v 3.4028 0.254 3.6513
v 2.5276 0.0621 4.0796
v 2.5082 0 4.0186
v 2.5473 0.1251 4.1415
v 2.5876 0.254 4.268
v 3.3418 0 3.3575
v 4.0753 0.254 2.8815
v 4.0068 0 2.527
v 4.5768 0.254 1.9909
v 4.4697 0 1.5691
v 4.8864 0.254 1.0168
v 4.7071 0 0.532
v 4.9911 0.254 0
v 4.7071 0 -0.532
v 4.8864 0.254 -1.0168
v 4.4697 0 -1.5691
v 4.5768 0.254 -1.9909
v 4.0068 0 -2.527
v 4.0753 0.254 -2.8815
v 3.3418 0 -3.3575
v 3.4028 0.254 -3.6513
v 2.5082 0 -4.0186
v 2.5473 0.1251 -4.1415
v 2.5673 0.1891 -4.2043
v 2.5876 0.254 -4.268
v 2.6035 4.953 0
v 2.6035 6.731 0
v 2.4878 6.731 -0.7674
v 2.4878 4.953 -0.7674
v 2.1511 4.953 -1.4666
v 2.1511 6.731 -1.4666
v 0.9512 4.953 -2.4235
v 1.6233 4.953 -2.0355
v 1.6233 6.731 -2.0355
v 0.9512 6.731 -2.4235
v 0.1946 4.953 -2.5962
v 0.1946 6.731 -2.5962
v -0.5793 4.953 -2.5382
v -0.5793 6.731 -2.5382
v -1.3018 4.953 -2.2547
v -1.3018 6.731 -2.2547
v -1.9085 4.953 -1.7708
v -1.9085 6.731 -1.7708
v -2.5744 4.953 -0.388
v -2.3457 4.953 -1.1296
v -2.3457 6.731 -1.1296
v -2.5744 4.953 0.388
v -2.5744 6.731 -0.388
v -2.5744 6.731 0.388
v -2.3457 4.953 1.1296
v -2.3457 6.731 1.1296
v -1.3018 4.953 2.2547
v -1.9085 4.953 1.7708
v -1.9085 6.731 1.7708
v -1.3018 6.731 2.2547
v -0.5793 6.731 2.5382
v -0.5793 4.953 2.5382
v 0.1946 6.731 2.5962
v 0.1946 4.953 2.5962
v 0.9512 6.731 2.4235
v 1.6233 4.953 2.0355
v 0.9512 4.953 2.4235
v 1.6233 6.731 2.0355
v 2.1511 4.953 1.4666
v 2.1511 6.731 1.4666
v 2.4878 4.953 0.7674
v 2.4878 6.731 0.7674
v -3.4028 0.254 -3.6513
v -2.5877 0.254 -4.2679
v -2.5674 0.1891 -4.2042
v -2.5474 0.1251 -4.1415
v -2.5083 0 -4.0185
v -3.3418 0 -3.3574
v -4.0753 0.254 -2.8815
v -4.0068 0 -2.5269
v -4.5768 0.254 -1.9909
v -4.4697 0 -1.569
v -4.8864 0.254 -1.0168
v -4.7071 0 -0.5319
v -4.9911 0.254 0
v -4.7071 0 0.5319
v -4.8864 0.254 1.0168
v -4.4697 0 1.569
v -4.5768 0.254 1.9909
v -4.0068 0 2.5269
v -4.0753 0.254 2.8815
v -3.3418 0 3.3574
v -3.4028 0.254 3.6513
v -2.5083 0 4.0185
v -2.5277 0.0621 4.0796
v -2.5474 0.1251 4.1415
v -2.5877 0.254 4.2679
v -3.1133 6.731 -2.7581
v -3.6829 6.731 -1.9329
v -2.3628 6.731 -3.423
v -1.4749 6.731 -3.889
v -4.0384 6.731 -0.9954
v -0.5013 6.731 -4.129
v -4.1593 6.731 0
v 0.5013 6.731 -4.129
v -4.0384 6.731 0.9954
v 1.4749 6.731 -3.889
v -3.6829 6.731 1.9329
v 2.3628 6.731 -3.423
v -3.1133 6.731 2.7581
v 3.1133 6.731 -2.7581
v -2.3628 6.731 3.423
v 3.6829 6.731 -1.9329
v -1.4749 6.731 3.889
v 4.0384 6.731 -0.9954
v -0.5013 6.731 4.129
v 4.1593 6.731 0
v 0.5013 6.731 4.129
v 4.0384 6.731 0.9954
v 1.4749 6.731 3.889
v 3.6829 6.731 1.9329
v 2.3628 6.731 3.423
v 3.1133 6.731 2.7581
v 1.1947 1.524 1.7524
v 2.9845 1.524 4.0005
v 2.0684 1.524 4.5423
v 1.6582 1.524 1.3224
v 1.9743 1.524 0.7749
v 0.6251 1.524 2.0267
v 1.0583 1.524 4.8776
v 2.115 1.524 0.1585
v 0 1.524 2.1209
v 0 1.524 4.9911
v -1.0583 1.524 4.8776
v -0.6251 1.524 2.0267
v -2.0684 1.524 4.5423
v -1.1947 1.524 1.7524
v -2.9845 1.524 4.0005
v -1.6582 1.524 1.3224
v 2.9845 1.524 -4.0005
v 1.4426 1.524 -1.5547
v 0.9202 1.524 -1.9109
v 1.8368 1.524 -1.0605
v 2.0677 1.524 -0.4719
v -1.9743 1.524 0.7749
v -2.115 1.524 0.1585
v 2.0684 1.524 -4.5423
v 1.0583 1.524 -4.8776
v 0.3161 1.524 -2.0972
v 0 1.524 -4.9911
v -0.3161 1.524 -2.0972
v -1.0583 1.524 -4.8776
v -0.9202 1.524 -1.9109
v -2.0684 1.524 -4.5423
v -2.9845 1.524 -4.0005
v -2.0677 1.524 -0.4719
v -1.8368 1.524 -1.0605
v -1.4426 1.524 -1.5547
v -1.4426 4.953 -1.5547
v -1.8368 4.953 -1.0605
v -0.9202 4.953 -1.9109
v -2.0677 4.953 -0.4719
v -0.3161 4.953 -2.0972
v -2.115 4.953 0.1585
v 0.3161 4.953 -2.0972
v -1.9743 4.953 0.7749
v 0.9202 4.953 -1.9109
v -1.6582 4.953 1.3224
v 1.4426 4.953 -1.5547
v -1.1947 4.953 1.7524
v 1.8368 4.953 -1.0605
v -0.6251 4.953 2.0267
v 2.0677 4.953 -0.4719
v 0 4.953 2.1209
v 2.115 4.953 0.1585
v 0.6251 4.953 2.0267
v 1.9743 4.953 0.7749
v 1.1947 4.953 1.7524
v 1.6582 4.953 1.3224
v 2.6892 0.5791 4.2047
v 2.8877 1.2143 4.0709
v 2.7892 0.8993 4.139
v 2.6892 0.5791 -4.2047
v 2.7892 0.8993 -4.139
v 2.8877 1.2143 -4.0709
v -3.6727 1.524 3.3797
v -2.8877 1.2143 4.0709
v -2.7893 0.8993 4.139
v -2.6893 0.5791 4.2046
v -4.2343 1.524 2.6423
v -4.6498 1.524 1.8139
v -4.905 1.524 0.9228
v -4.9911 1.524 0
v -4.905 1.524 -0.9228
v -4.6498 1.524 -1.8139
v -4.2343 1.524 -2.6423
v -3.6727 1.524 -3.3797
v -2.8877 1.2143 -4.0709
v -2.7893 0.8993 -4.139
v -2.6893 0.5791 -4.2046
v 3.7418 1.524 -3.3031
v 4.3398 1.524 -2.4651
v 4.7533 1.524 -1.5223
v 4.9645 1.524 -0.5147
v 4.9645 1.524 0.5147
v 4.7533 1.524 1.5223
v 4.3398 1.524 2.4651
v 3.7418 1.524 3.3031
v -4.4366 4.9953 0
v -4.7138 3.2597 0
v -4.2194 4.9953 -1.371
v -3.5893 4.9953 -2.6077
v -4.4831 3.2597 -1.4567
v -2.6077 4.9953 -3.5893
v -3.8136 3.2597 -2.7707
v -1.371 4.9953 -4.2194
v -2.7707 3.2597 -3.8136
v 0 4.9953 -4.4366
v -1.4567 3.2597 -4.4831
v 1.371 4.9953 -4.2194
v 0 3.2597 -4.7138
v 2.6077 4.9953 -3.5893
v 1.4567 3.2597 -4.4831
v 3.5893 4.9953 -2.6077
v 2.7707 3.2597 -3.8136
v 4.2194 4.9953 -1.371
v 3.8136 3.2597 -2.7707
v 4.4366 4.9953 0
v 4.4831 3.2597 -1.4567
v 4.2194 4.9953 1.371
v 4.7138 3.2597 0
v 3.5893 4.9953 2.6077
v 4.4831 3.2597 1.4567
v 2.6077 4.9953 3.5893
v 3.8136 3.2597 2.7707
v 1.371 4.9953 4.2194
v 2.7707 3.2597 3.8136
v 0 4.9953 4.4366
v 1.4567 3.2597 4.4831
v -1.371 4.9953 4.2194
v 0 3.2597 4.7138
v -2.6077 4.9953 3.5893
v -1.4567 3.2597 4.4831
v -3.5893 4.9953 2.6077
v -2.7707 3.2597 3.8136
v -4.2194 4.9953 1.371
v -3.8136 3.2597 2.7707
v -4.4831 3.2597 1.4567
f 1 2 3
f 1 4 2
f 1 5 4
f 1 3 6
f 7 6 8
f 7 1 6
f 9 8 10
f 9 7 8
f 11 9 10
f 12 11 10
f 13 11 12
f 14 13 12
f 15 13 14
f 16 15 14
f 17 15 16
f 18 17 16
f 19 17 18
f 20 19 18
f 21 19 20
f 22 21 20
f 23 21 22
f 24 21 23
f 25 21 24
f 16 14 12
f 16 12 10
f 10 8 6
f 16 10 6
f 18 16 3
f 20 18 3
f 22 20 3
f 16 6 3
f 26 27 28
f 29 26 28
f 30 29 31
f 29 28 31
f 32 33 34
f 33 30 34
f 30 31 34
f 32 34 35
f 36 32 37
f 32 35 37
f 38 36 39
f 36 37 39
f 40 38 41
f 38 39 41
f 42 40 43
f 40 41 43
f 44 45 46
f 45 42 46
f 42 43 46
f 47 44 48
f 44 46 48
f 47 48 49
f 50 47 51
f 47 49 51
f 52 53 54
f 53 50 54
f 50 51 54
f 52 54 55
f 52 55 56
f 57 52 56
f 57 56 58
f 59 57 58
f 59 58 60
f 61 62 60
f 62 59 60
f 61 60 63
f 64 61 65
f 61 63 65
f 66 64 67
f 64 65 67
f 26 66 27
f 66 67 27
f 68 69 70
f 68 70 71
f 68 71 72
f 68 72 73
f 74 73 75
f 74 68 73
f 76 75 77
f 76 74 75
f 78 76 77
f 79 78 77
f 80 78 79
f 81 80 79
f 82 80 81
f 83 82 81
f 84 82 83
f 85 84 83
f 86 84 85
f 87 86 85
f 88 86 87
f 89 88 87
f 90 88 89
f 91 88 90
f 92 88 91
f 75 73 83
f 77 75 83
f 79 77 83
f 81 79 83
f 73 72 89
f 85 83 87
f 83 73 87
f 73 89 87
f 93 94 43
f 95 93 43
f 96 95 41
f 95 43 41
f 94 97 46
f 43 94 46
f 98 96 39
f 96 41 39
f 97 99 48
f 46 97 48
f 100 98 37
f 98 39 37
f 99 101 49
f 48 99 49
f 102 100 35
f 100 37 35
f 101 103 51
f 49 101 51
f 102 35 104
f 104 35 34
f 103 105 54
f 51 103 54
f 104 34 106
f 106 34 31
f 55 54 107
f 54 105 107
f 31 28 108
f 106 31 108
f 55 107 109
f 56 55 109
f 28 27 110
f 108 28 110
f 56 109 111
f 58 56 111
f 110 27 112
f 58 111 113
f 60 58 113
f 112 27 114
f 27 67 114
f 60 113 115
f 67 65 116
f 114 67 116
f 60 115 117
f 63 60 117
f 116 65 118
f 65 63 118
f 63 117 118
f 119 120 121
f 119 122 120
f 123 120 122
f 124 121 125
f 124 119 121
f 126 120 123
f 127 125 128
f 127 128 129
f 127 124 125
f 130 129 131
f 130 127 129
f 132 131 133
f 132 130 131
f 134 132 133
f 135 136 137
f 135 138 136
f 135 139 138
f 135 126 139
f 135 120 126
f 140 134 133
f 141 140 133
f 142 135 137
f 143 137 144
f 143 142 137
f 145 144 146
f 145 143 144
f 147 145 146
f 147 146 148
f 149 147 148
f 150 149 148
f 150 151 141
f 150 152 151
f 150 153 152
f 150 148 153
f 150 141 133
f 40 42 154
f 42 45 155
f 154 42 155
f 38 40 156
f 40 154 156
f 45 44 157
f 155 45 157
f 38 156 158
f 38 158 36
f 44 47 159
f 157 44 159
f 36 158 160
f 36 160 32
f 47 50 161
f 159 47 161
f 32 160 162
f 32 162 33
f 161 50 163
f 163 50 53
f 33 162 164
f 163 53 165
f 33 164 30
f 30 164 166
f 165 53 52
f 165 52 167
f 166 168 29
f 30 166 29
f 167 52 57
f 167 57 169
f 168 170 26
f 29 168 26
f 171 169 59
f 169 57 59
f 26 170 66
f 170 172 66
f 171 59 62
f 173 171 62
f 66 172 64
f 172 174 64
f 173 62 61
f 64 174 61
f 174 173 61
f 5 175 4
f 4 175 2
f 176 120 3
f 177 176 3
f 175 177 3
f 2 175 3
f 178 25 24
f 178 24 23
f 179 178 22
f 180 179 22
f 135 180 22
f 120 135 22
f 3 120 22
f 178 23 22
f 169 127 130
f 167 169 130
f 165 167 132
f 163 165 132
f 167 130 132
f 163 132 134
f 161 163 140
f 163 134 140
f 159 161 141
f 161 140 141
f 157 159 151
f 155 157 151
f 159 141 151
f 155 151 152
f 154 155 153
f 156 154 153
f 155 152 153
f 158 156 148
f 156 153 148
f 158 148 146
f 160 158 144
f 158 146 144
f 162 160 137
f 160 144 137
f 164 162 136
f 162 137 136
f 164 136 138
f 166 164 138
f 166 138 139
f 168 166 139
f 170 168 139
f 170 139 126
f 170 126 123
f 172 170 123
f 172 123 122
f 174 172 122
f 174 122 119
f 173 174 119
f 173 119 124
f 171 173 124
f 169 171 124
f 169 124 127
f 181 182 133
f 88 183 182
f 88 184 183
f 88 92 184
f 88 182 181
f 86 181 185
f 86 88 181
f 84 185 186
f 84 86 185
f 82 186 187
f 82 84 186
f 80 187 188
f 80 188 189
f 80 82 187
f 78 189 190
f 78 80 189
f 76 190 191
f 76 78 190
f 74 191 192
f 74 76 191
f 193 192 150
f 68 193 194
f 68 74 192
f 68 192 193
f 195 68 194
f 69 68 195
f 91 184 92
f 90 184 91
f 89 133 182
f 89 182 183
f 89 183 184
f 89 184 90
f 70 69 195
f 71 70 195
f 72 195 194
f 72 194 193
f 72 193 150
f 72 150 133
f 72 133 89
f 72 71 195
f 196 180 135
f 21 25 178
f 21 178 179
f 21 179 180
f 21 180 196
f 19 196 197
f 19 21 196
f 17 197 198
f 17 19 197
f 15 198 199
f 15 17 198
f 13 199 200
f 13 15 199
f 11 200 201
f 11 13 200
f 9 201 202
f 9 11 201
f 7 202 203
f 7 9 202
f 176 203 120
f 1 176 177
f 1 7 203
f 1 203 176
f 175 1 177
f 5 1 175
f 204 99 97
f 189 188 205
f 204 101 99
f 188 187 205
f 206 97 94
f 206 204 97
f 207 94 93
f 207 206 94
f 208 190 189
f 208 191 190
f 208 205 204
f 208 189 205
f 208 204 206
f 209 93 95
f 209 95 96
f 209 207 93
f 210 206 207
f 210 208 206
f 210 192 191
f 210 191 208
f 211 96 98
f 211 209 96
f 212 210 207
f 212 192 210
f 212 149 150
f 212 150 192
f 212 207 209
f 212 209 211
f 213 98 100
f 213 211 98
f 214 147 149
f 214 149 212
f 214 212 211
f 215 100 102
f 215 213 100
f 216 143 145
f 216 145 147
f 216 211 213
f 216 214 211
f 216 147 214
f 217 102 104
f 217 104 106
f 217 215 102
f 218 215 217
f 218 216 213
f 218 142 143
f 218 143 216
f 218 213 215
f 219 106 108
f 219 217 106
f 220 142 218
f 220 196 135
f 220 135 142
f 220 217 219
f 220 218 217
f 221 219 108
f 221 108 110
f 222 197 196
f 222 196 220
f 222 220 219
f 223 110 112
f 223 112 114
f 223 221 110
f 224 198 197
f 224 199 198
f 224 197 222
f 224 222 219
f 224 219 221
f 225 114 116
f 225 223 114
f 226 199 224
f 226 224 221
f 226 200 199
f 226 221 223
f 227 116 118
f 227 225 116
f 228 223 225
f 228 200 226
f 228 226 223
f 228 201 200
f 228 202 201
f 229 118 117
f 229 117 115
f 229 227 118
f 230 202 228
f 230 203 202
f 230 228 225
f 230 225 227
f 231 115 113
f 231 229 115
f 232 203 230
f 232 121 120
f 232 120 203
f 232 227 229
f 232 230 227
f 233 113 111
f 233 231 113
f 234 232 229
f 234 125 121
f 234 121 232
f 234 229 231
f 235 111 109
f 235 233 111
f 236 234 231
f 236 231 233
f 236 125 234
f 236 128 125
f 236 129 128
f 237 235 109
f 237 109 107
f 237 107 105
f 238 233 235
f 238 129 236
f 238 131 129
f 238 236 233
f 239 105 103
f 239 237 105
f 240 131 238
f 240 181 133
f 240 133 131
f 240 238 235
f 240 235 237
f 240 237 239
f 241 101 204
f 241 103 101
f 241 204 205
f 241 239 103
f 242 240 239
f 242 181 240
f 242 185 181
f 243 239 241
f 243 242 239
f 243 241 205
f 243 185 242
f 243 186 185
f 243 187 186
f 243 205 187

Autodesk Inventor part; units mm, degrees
ref_plane "YZ Plane" through (0, 0, 0) normal (1, 0, 0) x (0, 1, 0)
sketch "Sketch1" plane through (0, 0, 0) normal (0, 1, 0) x (-1, 0, 0)
  circle A0 centre (0, 0) radius 4.9911
  dimension "d0" = 9.9822
extrude "Extrusion1" add sketch "Sketch1" along normal blind 1.524
sketch "Sketch2" plane through (0, 1.524, 0) normal (0, 1, 0) x (1, 0, 0)
  point P0 (0, 0)
ref_plane "Work Plane1" through (0, 6.731, 0) normal (0, -1, 0) x (1, 0, 0)
sketch "Sketch3" plane through (0, 6.731, 0) normal (0, -1, 0) x (1, 0, 0)
  circle A0 centre (0, 0) radius 4.1593
  circle A1 centre (0, 0) radius 2.6035
  dimension "d4" = 8.3185
  dimension "d9" = 5.207
loft "Loft1" add profiles "Sketch3" section 1 edges at (4.9911, 1.524, 0) contours A0 | A1
hole "Hole1" at (0, 6.731, 0) direction (0, -1, 0) diameter 4.2418 end through all thread size "10-48 UNS" class "2B" standard "ANSI Unified Screw Threads"
extrude "Extrusion3" cut sketch "Sketch3" along normal blind 1.778 contours A1
ref_plane "Work Plane2" through (0, 0, -4.9911) normal (0, 0, 1) x (1, 0, 0)
chamfer "Chamfer1" distance 0.254 angle 45 1 edges at (4.9911, 0, 0)
sketch "Sketch4" plane through (0, 0, -4.9911) normal (0, 0, 1) x (1, 0, 0)
  line L0 (4.9911, 1.524) -> (-4.9911, 1.524) projected
  line L1 (0, 1.524) -> (0, 0)
  line L2 (2.5082, 1.524) -> (-2.5083, 1.524)
  line L3 (-2.5083, 1.524) -> (-2.5083, 0)
  line L4 (-2.5083, 0) -> (2.5082, 0)
  line L5 (2.5082, 0) -> (2.5082, 1.524)
  line L6 (2.5082, 1.524) -> (-2.5083, 0) construction
  line L7 (-2.5083, 1.524) -> (2.5082, 0) construction
  line L8 (2.9845, 1.524) -> (-2.9845, 1.524)
  line L9 (-2.9845, 1.524) -> (-2.9845, 0)
  line L10 (-2.9845, 0) -> (2.9845, 0)
  line L11 (2.9845, 0) -> (2.9845, 1.524)
  line L12 (2.9845, 1.524) -> (-2.9845, 0) construction
  line L13 (-2.9845, 1.524) -> (2.9845, 0) construction
  line L14 (2.9845, 1.524) -> (2.5082, 0)
  line L15 (-2.9845, 1.524) -> (-2.5083, 0)
  point P0 (4.9911, 0)
  point P1 (-4.9911, 0)
  point P2 (0, 0.762)
  dimension "d23" = 5.0165
  dimension "d24" = 5.969
extrude "Extrusion4" cut sketch "Sketch4" along normal through all contours L14 L5 L0 | L5 L4 L1 L0 | L1 L4 L3 L0 | L3 L15 L0
properties part number "0.375 Shaft Dovetail" material "Stainless Steel"
